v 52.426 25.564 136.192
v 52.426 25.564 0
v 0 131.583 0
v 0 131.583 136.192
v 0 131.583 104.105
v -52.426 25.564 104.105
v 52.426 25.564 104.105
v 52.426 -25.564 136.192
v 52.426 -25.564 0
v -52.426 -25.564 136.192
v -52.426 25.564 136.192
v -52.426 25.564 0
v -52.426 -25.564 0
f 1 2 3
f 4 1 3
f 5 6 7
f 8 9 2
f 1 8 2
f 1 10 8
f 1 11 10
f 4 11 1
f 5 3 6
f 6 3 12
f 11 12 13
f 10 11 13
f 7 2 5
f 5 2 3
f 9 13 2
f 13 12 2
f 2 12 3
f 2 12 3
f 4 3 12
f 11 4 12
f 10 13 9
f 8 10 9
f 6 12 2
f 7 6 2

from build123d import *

# Parameters (mm, degrees)
F1_DEPTH = 104.105085
F2_DEPTH = 136.192122


with BuildPart() as f1:
    # F0 (on Top) → F1 (new body)
    with BuildSketch(Plane.XY):
        Polygon((0, 25.563598), (52.425861, 25.563598), (0, 131.583005), align=None)
        Polygon((-52.425861, 25.563598), (0, 25.563598), (0, 131.583005), align=None)
    extrude(amount=F1_DEPTH)


with BuildPart() as f2:
    # F0 (on Top) → F2 (new body)
    with BuildSketch(Plane.XY):
        Polygon((52.425861, -25.563598), (52.425861, 25.563598), (0, 25.563598), (-52.425861, 25.563598), (-52.425861, -25.563598), align=None)
        Polygon((0, 25.563598), (52.425861, 25.563598), (0, 131.583005), align=None)
        Polygon((-52.425861, 25.563598), (0, 25.563598), (0, 131.583005), align=None)
    extrude(amount=F2_DEPTH)


solid = Compound([f1.part, f2.part])
